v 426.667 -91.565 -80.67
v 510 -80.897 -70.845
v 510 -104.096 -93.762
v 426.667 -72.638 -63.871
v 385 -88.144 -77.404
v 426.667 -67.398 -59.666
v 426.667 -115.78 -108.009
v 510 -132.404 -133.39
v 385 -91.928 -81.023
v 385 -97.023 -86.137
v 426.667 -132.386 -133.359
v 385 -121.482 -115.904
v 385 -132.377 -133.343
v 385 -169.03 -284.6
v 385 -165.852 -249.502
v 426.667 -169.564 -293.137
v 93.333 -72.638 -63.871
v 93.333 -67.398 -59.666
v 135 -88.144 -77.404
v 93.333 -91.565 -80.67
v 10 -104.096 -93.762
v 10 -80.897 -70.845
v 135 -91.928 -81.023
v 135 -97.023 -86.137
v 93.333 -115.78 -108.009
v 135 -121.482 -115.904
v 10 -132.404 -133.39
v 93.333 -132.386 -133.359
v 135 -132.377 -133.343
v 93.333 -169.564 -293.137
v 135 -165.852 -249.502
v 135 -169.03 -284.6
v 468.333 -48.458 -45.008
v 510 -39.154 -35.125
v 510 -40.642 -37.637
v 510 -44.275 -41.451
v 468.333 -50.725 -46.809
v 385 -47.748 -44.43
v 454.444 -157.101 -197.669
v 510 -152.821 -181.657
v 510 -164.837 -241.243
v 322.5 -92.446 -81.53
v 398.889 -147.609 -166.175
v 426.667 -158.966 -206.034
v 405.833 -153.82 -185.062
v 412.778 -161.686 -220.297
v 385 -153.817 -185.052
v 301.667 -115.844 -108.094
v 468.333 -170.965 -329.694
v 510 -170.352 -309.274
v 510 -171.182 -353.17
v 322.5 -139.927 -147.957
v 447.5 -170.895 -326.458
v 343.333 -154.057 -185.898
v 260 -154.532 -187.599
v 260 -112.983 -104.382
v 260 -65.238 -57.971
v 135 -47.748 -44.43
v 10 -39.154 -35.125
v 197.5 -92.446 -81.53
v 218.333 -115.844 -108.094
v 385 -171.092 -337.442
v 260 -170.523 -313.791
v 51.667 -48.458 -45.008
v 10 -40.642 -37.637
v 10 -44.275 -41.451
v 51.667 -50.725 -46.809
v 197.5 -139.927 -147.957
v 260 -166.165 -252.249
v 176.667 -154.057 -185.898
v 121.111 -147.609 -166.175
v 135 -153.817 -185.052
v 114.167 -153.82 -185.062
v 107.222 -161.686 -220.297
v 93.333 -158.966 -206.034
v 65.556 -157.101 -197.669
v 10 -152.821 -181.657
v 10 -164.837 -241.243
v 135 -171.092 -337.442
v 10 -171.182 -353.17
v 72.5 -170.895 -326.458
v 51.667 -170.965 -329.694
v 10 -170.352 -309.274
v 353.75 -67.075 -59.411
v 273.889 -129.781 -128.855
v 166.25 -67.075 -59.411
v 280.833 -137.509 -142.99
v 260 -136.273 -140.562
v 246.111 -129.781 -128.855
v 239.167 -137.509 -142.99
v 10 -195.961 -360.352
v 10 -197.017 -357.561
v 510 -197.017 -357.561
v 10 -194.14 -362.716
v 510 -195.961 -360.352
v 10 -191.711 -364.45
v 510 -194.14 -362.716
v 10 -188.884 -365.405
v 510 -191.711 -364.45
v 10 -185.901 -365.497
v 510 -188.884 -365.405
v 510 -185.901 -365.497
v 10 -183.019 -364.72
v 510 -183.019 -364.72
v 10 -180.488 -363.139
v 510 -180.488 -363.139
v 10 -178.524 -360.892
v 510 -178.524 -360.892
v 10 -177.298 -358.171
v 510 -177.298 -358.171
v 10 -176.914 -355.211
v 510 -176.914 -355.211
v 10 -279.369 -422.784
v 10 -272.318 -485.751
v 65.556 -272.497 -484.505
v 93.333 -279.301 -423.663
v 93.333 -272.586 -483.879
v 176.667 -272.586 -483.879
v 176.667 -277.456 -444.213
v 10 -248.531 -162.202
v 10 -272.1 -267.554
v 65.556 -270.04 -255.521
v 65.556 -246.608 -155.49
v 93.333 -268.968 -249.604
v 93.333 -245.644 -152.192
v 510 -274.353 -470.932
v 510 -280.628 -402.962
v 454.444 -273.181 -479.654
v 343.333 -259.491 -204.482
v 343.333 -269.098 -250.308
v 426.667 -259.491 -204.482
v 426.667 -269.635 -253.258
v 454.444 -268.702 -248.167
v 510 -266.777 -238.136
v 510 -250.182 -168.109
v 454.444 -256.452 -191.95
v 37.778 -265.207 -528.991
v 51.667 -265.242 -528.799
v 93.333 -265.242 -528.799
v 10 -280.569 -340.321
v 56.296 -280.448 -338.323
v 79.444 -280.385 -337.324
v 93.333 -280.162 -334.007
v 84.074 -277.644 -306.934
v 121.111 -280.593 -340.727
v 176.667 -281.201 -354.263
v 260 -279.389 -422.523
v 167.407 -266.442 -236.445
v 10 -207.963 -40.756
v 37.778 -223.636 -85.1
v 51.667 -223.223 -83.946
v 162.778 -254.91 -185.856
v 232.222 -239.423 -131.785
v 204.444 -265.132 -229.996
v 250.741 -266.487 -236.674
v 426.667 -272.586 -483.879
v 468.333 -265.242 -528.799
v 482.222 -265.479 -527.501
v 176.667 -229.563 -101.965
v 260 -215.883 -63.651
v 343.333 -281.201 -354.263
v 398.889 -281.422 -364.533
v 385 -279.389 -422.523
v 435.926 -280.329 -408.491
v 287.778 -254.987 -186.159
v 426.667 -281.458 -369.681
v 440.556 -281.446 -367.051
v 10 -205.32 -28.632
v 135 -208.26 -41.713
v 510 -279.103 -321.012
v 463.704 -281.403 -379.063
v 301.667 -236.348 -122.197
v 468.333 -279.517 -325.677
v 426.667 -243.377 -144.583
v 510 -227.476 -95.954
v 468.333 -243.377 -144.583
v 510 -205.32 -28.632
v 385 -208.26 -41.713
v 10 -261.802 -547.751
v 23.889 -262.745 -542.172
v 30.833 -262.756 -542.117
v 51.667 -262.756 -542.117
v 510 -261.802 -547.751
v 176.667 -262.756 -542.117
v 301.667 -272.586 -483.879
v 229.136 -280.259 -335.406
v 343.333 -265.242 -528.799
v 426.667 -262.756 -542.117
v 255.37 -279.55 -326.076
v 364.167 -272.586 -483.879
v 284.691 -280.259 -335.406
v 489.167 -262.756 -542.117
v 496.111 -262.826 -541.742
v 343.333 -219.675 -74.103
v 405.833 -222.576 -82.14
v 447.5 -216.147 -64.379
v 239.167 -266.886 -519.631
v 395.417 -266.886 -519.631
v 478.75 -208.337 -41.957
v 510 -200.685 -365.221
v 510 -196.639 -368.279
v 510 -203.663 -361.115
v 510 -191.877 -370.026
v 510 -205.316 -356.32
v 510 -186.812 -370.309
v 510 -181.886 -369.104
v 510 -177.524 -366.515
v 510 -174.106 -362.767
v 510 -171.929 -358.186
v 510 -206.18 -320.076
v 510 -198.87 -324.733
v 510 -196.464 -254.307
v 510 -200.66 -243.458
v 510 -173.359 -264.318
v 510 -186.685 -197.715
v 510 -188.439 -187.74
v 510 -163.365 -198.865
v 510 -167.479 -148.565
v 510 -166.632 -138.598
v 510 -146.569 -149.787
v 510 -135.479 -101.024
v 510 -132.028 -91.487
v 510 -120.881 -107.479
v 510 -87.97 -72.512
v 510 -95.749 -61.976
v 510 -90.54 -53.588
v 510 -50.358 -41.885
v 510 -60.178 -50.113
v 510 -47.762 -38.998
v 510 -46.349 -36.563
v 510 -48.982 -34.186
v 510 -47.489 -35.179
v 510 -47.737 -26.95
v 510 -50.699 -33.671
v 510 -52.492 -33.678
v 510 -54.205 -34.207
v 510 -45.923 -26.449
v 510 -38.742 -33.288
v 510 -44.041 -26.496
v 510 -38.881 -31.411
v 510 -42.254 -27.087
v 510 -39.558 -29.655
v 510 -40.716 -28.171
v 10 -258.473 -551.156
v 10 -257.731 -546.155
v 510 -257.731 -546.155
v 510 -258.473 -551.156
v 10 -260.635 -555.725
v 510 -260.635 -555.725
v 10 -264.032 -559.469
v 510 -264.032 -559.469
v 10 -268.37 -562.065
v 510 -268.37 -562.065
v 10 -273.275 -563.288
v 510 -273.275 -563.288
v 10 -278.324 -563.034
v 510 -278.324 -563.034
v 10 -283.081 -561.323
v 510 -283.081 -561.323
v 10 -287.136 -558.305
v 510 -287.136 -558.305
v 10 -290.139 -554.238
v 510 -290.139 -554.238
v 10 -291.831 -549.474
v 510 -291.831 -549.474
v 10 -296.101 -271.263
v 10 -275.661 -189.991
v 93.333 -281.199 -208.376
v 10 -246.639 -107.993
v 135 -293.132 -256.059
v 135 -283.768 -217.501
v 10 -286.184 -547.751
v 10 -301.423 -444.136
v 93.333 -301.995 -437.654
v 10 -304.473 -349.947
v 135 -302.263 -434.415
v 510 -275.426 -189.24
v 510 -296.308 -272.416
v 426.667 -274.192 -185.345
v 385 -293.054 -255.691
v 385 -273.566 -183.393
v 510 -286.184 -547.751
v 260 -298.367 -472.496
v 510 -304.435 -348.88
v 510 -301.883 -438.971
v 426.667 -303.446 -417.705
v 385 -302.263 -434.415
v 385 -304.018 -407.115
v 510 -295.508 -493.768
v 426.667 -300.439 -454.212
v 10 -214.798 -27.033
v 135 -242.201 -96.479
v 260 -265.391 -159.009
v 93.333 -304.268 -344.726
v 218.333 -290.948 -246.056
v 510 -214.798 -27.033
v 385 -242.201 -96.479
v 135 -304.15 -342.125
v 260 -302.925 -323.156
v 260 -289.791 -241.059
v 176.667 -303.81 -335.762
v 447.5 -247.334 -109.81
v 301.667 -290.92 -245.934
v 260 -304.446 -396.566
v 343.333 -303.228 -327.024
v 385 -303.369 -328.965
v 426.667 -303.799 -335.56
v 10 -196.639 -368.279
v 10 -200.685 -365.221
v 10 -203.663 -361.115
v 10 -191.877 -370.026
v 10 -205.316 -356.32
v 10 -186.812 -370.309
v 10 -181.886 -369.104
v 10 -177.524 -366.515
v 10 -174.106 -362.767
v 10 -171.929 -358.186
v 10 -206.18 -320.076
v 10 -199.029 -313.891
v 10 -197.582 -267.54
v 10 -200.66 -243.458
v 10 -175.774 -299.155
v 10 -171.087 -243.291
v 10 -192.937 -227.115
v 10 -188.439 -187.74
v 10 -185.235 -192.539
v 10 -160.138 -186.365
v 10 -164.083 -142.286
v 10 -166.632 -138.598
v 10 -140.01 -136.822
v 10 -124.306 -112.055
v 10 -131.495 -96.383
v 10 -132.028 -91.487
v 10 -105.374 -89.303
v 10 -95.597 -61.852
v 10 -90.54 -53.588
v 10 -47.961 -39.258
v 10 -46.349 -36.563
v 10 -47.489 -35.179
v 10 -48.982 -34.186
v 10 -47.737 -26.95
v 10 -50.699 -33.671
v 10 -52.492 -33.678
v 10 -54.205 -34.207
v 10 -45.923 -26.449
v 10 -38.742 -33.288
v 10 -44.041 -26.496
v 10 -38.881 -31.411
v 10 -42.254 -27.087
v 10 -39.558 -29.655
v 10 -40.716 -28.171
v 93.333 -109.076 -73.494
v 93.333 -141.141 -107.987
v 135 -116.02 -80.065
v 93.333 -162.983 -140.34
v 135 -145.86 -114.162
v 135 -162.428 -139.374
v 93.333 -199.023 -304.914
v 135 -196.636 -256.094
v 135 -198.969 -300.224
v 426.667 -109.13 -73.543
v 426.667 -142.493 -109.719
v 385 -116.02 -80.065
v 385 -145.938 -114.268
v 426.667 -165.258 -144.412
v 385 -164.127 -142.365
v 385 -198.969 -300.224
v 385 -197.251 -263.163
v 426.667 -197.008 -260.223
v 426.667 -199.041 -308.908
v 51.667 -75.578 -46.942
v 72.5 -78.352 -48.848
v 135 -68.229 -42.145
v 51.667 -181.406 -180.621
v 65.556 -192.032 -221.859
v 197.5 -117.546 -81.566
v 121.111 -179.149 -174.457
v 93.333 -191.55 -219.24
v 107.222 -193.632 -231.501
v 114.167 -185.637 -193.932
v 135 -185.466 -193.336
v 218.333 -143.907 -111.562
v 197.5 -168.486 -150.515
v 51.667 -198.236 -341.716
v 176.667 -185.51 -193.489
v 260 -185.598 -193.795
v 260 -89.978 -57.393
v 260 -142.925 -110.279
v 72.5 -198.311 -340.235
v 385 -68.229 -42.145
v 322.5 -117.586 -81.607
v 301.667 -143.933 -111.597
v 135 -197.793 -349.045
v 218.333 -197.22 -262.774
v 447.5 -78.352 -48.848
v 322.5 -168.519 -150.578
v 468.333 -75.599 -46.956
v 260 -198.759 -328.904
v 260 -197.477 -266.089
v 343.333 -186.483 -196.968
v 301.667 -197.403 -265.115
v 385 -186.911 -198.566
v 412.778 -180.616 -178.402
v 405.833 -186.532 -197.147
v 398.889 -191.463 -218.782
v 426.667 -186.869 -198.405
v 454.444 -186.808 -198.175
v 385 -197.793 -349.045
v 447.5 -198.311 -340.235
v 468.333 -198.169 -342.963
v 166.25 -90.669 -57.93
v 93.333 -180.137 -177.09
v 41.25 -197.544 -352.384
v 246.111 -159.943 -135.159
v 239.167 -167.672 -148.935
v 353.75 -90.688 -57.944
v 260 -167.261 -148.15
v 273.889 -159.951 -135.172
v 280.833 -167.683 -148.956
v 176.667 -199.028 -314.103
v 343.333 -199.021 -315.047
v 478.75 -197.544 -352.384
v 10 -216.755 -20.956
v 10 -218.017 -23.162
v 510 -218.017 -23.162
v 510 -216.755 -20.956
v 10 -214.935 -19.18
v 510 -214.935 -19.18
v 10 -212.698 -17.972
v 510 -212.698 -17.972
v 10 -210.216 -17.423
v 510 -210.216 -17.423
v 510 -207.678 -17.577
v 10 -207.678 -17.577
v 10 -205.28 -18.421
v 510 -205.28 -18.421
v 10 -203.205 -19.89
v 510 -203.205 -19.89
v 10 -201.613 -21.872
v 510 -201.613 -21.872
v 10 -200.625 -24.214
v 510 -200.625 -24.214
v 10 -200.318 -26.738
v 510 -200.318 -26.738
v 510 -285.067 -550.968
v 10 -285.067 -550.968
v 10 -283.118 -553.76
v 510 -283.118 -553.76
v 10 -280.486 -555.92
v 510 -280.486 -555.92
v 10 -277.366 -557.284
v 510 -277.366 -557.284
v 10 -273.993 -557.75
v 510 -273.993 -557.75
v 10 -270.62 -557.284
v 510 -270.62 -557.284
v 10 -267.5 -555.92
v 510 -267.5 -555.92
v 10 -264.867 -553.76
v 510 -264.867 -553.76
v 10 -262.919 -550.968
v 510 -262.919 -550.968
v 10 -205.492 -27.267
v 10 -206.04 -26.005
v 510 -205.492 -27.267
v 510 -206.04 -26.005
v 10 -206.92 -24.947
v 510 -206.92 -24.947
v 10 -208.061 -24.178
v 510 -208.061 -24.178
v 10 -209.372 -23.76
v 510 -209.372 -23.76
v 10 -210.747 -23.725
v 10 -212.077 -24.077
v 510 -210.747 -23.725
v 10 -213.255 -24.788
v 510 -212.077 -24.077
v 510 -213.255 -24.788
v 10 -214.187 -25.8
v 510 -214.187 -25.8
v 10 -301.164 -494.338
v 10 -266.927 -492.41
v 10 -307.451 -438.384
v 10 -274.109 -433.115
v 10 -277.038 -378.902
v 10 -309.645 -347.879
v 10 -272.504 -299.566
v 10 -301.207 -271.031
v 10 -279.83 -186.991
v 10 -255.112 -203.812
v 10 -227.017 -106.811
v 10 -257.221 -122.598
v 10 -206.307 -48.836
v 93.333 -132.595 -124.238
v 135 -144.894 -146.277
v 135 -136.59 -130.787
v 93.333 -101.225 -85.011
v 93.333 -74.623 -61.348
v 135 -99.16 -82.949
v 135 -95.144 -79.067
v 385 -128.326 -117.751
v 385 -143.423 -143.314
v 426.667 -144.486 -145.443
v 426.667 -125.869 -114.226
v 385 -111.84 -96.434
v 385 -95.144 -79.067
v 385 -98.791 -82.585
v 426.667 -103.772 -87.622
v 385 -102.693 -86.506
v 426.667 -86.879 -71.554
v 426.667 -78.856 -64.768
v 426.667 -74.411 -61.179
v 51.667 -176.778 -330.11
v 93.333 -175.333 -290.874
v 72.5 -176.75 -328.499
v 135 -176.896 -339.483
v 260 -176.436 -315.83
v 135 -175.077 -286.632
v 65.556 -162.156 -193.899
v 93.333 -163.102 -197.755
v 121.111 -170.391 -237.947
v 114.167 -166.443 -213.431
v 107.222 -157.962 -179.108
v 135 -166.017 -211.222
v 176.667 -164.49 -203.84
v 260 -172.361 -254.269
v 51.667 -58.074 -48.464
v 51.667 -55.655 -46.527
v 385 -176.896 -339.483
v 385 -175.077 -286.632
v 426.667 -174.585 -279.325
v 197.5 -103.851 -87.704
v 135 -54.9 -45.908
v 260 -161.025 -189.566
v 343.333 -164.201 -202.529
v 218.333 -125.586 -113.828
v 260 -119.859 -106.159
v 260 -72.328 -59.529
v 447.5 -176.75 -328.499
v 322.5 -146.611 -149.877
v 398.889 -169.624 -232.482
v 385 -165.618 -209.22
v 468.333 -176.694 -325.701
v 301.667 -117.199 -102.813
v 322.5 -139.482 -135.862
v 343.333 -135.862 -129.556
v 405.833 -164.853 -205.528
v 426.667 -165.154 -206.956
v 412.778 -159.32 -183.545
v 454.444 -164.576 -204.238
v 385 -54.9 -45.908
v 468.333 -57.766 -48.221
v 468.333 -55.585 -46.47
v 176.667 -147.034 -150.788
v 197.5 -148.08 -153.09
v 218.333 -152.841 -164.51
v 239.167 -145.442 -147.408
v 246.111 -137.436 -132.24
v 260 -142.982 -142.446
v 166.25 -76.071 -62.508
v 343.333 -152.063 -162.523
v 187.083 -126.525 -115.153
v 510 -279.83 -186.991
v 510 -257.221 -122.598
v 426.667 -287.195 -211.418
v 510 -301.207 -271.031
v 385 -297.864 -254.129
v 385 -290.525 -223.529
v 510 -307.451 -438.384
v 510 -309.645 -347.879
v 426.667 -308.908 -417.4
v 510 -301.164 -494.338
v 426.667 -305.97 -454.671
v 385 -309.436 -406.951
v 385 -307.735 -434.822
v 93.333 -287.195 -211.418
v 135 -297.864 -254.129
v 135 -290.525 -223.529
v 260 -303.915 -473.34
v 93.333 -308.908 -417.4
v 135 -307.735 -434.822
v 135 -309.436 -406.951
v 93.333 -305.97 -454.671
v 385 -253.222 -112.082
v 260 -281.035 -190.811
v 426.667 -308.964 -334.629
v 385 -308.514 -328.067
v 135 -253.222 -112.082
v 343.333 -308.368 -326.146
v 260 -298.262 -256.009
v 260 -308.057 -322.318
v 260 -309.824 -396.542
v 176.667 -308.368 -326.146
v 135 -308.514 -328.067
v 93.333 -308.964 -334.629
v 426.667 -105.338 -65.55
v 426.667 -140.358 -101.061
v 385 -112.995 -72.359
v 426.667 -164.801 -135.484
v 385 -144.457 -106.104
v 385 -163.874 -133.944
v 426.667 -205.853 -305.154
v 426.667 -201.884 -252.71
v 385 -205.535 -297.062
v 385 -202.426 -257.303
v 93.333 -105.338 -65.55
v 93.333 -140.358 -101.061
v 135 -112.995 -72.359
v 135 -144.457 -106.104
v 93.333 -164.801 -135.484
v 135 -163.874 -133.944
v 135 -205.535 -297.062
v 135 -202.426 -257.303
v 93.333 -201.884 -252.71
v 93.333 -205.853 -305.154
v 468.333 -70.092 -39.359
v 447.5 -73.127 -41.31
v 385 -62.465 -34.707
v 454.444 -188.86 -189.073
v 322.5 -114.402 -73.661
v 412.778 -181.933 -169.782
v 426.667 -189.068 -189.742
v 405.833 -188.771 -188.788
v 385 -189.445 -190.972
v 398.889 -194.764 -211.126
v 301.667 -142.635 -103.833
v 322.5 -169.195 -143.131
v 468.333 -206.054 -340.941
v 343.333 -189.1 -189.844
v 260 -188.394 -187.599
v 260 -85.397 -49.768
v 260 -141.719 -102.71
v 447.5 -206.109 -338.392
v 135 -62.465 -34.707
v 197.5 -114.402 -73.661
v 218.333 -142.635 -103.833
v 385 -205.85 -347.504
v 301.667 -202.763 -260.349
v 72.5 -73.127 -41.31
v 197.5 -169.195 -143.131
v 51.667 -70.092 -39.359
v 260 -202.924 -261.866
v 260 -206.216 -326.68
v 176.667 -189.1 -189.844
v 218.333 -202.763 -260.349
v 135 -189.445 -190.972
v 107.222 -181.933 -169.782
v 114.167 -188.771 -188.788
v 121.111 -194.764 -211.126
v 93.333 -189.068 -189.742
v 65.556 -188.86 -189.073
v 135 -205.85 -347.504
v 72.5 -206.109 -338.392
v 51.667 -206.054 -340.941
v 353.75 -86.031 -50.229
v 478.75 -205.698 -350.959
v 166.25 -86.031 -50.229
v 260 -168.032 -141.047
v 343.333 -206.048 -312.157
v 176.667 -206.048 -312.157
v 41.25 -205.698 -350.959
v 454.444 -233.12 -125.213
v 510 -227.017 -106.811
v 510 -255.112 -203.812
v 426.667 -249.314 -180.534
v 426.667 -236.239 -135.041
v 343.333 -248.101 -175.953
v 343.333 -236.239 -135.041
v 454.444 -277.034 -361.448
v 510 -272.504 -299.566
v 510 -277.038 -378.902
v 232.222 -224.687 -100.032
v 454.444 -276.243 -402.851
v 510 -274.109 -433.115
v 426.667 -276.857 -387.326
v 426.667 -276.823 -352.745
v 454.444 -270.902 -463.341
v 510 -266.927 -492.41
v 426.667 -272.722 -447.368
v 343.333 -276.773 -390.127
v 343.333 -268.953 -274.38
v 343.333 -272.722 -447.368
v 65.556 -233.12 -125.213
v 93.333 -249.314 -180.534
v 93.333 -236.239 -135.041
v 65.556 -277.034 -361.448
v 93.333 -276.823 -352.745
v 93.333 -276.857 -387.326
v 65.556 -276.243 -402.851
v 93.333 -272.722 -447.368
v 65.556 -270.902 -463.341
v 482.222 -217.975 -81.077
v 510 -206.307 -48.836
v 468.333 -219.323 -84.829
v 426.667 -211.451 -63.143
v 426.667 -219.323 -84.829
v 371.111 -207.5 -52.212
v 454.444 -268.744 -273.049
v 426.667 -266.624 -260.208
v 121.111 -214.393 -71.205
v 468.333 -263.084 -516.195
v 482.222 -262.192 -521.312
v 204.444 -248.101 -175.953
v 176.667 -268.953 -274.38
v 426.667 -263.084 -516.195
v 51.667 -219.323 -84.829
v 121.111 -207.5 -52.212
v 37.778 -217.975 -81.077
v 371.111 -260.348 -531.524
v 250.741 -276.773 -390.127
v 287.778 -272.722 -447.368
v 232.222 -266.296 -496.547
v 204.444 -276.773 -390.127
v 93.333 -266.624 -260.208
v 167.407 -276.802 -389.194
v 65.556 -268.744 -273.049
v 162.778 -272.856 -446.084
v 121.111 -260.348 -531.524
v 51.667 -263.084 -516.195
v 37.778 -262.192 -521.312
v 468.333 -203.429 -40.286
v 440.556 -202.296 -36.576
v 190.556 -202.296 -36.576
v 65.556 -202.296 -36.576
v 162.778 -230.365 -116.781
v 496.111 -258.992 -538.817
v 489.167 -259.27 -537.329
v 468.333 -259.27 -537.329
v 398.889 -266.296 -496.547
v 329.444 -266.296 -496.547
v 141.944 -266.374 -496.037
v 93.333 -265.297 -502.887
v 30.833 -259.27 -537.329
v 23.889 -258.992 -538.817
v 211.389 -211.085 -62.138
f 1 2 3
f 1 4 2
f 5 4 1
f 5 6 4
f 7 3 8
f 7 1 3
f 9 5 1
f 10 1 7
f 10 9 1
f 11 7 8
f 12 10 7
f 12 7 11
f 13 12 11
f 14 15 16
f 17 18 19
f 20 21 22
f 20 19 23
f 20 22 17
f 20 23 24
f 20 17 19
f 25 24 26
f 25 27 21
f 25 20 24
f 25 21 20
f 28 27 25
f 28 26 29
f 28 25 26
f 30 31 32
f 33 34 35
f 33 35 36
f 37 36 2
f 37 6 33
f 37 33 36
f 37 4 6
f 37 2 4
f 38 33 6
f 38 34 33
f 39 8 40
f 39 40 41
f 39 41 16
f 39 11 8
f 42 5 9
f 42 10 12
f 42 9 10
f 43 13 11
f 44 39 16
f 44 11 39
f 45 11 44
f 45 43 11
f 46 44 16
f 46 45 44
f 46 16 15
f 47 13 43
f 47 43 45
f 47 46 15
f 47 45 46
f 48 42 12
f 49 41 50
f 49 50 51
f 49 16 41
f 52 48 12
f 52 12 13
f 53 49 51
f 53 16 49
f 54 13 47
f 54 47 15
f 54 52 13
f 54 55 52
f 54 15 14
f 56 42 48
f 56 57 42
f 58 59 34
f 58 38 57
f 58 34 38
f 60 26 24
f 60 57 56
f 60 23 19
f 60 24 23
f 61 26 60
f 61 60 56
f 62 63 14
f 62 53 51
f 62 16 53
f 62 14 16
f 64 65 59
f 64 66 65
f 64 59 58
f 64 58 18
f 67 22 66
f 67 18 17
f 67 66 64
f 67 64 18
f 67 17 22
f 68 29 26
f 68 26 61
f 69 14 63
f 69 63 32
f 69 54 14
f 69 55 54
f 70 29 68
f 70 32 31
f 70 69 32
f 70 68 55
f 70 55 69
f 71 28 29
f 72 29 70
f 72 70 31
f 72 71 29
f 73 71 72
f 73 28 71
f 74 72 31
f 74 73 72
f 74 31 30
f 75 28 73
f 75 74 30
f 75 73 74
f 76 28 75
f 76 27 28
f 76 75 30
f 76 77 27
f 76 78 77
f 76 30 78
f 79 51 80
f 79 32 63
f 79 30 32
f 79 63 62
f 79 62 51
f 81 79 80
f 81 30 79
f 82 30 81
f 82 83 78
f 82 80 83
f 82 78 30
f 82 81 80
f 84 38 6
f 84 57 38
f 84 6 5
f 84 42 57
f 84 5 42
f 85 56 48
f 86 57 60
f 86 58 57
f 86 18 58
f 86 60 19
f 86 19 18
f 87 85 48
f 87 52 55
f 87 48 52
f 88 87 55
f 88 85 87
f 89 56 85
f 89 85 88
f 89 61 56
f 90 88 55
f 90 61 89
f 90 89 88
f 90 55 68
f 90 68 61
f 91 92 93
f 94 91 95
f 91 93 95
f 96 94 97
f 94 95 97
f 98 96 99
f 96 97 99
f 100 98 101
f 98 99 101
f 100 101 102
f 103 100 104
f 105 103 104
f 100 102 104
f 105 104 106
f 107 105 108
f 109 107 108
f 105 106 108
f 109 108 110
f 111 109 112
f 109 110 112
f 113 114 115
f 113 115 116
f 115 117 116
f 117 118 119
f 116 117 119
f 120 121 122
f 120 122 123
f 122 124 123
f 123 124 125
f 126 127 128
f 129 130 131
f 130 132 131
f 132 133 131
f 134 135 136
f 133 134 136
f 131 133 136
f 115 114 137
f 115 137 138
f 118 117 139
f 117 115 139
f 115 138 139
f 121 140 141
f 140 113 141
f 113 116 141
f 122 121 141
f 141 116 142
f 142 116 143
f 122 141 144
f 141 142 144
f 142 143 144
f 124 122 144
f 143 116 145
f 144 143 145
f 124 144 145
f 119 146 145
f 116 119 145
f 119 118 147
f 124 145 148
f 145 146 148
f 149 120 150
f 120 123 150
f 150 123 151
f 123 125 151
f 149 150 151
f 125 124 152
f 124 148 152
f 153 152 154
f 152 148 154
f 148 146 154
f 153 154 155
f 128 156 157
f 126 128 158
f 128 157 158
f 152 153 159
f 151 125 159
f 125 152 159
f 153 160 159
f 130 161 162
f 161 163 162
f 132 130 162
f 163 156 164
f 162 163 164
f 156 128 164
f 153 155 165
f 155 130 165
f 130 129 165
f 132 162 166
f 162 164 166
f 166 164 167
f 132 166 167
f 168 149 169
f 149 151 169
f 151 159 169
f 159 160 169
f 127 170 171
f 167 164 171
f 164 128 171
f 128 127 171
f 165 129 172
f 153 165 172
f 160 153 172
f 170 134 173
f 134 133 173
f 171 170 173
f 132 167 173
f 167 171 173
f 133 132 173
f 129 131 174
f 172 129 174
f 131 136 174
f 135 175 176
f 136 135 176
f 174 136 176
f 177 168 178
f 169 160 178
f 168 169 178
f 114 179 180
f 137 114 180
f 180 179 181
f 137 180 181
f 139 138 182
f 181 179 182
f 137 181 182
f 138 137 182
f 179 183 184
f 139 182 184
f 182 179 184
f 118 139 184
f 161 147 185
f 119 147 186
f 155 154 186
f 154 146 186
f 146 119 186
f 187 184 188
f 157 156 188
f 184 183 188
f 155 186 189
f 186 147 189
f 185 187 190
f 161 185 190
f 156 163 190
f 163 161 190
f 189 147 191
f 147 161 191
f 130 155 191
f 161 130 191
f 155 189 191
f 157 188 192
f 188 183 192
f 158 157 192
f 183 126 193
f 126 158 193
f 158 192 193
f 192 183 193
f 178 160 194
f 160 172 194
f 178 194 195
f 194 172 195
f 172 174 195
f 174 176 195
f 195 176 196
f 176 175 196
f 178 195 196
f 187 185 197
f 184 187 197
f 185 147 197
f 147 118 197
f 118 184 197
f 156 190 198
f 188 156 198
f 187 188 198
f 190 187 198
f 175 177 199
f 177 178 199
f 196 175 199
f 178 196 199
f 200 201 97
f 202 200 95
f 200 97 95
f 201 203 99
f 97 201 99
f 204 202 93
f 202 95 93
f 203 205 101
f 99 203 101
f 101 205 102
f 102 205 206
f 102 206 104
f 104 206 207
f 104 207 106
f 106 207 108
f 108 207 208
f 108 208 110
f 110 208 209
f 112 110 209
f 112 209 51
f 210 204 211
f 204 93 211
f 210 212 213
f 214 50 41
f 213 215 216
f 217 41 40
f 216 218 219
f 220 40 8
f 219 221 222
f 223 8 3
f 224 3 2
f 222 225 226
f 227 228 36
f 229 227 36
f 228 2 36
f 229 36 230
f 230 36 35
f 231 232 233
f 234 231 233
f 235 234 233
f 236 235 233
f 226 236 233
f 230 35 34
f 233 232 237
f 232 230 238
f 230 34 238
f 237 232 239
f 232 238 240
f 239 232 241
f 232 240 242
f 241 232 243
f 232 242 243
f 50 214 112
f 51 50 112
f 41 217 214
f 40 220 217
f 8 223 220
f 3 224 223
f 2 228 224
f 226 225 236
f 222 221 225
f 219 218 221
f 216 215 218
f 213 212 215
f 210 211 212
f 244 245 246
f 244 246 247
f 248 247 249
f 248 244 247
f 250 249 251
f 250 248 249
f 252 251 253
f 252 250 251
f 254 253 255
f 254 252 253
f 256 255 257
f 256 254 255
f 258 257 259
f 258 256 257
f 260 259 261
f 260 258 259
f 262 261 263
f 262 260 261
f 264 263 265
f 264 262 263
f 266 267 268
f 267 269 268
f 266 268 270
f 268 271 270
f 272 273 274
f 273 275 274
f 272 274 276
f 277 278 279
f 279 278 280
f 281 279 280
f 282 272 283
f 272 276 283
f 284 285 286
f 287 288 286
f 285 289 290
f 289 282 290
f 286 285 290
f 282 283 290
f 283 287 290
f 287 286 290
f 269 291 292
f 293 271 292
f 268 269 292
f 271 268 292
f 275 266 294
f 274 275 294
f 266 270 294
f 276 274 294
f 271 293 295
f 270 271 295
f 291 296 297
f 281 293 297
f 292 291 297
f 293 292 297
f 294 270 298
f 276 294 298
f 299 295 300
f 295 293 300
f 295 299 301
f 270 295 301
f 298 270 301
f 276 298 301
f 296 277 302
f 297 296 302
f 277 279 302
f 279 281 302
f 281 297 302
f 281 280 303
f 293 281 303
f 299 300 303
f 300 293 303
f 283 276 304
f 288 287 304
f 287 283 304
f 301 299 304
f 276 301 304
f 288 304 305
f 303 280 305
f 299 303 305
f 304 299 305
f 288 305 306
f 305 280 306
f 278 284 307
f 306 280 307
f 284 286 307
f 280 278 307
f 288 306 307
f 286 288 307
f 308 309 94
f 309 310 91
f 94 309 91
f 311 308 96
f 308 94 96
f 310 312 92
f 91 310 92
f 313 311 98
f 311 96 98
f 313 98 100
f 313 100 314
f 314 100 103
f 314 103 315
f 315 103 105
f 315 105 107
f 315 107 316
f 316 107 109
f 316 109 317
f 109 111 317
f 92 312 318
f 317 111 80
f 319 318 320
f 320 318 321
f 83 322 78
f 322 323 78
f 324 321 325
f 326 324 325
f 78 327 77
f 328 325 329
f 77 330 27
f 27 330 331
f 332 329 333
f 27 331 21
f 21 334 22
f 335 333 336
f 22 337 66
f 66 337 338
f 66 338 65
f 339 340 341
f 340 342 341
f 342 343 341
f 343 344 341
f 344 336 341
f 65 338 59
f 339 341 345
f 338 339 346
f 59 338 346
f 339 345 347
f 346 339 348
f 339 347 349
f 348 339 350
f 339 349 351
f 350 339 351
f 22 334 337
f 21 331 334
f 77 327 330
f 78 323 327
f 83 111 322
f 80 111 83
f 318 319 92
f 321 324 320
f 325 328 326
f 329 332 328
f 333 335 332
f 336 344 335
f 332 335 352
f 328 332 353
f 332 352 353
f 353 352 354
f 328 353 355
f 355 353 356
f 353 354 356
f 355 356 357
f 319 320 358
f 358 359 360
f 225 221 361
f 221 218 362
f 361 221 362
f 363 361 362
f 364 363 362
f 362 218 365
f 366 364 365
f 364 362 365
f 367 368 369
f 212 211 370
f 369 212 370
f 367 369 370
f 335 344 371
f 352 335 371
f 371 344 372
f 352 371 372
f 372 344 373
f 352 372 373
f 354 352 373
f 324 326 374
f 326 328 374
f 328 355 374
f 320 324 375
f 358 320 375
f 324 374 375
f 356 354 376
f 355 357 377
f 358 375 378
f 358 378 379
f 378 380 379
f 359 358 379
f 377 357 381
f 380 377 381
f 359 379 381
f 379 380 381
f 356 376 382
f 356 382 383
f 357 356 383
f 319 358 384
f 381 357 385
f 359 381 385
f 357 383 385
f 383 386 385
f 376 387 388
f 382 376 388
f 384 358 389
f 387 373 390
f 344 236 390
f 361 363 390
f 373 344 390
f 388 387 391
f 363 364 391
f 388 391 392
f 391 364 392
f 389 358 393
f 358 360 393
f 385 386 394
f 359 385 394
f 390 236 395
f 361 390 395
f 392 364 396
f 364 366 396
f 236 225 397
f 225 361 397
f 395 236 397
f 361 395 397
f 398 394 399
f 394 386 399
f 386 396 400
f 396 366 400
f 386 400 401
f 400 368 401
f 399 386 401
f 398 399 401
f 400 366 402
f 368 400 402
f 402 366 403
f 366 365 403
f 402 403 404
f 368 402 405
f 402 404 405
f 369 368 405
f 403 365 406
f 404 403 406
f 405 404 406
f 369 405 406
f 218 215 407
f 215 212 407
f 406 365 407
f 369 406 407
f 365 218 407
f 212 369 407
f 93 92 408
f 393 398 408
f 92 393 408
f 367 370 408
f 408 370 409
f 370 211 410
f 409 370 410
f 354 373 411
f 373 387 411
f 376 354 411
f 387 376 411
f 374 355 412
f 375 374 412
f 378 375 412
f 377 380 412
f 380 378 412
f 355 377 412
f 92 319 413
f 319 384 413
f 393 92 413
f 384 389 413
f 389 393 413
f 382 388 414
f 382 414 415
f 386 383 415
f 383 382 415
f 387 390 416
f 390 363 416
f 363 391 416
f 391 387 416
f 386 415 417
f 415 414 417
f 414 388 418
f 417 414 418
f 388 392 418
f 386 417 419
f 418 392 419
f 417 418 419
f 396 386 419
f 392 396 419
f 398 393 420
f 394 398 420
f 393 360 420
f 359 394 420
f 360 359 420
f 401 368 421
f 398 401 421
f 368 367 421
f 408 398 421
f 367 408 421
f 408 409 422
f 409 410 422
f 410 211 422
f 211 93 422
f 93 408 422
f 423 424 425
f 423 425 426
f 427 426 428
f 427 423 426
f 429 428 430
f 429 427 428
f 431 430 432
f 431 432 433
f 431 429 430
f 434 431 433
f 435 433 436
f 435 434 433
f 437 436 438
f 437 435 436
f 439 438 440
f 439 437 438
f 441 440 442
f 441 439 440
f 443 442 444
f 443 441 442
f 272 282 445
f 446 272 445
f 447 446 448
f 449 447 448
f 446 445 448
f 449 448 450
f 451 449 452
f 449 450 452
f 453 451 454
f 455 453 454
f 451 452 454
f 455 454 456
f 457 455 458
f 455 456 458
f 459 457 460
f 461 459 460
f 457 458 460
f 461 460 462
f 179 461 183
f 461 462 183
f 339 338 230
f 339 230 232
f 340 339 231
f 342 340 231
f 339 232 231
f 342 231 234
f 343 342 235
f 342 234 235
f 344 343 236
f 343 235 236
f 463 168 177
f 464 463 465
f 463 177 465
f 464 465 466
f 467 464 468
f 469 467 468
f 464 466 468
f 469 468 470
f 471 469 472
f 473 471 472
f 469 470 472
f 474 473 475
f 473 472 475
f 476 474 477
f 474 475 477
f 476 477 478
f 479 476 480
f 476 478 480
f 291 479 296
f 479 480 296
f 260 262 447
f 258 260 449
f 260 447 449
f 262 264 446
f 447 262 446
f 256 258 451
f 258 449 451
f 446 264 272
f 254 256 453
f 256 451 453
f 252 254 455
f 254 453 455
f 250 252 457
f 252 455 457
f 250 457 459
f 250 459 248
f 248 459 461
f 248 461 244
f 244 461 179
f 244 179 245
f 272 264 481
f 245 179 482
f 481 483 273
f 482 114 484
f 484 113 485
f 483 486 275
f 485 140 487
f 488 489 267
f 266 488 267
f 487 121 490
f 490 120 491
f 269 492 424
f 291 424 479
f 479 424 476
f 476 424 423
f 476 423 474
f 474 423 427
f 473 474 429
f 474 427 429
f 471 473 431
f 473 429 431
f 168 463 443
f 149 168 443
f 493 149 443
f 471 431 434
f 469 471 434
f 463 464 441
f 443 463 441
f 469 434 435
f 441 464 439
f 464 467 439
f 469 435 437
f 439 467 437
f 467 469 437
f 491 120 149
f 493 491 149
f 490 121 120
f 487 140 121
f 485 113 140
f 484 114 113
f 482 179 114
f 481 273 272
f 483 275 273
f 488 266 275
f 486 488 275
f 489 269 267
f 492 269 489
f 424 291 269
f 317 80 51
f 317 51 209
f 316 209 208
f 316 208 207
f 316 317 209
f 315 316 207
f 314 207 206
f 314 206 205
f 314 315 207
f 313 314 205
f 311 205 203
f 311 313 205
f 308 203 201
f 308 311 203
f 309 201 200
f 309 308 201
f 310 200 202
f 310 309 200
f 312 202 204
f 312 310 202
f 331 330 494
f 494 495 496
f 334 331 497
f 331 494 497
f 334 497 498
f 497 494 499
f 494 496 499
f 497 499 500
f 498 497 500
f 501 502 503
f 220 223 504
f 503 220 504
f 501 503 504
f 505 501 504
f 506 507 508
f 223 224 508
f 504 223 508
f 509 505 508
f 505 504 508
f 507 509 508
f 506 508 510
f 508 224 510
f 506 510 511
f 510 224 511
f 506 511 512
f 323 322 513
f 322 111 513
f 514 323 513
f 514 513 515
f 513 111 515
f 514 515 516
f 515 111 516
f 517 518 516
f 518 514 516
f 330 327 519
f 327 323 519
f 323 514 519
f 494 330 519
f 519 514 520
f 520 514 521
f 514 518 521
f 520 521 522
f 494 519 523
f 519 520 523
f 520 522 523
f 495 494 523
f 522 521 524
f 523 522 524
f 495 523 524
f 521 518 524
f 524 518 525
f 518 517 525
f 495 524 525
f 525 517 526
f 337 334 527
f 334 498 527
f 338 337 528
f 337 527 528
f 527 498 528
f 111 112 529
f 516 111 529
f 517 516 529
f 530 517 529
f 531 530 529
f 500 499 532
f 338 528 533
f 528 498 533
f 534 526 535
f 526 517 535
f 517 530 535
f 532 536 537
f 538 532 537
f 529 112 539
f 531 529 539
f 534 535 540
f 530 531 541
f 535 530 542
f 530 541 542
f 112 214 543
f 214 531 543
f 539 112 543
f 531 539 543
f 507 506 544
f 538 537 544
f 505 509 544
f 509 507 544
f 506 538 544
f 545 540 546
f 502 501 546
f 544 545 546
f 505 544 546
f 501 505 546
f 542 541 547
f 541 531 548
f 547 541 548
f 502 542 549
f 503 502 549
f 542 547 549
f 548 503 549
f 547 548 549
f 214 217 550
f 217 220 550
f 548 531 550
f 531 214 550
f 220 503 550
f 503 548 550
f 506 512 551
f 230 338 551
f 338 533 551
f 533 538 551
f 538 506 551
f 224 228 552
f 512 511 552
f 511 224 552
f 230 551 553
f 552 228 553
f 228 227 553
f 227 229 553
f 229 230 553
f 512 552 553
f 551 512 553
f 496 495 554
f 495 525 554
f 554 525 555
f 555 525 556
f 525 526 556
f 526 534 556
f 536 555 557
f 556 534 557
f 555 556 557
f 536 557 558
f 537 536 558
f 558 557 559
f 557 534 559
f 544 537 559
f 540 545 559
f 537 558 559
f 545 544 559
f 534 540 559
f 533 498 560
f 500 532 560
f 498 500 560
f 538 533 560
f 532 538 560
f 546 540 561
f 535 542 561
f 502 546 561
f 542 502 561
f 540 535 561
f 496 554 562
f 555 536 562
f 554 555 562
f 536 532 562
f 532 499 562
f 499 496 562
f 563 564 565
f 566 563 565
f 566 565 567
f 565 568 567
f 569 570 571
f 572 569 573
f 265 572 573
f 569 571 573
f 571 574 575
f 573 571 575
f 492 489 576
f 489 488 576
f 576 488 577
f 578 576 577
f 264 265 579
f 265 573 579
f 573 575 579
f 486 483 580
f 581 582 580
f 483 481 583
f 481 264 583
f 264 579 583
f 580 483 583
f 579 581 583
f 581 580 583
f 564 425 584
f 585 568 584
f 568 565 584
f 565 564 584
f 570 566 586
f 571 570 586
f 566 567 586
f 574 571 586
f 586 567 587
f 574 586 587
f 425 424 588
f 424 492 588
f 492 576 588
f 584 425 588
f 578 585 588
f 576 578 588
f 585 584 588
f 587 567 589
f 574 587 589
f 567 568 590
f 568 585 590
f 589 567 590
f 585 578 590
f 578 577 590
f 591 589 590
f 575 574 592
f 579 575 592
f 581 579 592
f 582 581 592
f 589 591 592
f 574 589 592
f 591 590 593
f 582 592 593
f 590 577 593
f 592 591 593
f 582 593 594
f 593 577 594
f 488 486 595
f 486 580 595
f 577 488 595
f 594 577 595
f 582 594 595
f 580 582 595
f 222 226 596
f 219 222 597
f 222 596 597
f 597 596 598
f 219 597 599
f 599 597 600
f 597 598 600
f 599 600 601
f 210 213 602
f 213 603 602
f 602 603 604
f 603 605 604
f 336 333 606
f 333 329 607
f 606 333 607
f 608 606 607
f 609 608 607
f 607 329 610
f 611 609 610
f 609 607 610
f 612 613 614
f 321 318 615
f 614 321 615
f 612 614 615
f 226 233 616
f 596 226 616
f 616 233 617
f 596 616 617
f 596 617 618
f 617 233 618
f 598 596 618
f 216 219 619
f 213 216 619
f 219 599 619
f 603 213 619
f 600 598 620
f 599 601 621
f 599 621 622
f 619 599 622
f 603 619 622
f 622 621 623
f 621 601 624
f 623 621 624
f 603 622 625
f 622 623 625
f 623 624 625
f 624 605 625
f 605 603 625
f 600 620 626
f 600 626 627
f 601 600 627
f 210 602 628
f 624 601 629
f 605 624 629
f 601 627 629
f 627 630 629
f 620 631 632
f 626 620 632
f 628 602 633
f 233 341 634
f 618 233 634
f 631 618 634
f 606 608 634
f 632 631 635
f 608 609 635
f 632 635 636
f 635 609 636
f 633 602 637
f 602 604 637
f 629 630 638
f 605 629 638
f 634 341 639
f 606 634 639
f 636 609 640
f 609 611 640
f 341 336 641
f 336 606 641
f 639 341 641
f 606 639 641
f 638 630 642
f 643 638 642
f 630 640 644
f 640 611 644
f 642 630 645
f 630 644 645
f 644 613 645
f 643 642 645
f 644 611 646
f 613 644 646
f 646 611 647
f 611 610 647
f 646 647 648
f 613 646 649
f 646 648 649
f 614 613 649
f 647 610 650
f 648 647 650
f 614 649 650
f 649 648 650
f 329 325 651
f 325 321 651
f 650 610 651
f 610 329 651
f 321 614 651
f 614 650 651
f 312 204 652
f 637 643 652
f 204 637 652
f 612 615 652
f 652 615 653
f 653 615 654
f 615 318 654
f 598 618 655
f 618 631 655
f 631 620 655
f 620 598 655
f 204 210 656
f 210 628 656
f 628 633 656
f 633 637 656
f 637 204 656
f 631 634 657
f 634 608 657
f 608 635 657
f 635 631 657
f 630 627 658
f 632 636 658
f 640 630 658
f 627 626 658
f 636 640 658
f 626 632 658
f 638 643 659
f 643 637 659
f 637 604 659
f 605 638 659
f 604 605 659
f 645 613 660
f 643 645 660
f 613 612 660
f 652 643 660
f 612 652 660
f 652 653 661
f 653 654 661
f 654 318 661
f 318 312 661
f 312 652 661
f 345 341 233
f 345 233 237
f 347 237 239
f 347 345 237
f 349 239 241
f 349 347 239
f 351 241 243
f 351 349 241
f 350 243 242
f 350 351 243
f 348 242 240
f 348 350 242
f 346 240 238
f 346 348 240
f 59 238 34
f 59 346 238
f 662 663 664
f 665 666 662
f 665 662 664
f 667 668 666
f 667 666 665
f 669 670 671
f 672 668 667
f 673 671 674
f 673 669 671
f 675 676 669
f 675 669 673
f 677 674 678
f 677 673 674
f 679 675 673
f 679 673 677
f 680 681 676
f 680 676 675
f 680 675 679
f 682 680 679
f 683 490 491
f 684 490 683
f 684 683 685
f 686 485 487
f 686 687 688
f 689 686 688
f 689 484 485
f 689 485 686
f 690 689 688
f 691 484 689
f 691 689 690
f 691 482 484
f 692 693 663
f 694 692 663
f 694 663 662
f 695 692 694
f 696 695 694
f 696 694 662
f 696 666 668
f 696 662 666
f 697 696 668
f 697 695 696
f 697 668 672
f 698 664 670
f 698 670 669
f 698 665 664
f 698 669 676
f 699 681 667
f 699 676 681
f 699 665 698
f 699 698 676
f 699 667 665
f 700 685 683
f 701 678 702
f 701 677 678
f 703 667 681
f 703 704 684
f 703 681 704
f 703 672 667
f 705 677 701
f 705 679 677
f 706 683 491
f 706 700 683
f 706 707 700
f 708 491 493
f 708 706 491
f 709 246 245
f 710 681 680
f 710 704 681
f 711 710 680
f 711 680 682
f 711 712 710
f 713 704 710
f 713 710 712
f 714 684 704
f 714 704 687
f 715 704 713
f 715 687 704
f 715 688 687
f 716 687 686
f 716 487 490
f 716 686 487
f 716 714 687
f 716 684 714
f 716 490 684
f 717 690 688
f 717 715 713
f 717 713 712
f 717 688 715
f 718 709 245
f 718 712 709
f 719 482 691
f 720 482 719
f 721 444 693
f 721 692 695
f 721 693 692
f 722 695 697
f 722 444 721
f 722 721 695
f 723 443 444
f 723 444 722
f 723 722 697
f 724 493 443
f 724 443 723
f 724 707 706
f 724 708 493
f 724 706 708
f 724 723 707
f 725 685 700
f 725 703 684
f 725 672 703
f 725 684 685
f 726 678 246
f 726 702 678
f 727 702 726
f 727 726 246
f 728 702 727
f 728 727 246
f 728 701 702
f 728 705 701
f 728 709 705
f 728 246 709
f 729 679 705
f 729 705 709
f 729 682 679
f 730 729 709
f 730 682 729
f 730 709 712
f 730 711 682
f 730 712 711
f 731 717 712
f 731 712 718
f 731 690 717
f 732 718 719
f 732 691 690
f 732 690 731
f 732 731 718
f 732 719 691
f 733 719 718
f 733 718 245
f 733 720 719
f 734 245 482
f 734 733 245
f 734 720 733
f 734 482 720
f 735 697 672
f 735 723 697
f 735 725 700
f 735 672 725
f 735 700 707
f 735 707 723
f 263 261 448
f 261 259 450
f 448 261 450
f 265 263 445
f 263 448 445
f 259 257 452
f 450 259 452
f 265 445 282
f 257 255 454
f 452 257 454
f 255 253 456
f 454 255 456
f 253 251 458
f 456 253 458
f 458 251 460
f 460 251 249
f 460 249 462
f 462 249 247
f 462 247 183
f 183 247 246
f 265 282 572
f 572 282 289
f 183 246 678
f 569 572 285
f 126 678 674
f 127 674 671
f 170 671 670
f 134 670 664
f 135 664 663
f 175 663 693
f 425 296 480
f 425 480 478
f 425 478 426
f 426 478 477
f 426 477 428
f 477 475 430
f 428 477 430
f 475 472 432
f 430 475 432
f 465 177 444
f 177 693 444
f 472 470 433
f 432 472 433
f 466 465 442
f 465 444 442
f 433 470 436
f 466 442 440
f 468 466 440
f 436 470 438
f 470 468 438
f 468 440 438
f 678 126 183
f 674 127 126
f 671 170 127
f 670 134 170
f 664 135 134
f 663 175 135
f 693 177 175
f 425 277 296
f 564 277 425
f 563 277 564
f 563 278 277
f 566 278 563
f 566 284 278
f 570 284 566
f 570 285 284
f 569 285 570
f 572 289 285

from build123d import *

# Parameters (mm, degrees)
BOSS_EXTRUDE1_DEPTH = 10
BOSS_EXTRUDE3_DEPTH = 500
SPLIT1_DEPTH        = 10
CUT_EXTRUDE4_DEPTH  = 815.609824939


# Read off the part's stored shape, not the designer's step: Split1
with BuildPart() as part:
    # Sketch1 → Boss-Extrude1 (new body)
    with BuildSketch(Plane(origin=(0, 0, 0), x_dir=(0, 0, -1), z_dir=(1, 0, 0))):
        with BuildLine():
            Line((0, -14.281480067), (0, -294.281480067))
            ThreePointArc((0, -294.281480067), (8.786796564, -315.494683503), (30, -324.281480067))
            Line((30, -324.281480067), (573.815572472, -324.281480067))
            ThreePointArc((573.815572472, -324.281480067), (580.886640283, -321.352547879), (583.815572472, -314.281480067))
            Line((583.815572472, -314.281480067), (583.815572472, -219.493566063))
            ThreePointArc((583.815572472, -219.493566063), (582.007092914, -213.757801699), (577.235773905, -210.096639855))
            Line((577.235773905, -210.096639855), (13.420201433, -4.88455386))
            ThreePointArc((13.420201433, -4.88455386), (4.264235636, -6.089959625), (0, -14.281480067))
        make_face()
    extrude(amount=BOSS_EXTRUDE1_DEPTH)

    # Sketch2 → Boss-Extrude3 (add)
    with BuildSketch(Plane(origin=(10, 0, 0), x_dir=(0, 0, -1), z_dir=(1, 0, 0))):
        with BuildLine():
            ThreePointArc((23.162175785, -218.017297737), (17.576945532, -207.678107035), (26.738120061, -200.318314743))
            add(Edge.make_bspline(
                [(26.738120061, -200.318314743), (45.914354434, -200.660753587), (151.32107334, -255.510398156), (414.880335601, -286.385074175), (542.431128002, -257.731725159), (546.154906269, -257.731029979)],
                knots=[0, 0, 0, 0, 0.560935224, 0.660935224, 1, 1, 1, 1], degree=3))
            ThreePointArc((546.154906269, -257.731029979), (563.288388976, -273.27487263), (549.474047026, -291.831036849))
            add(Edge.make_bspline(
                [(23.162175785, -218.017297737), (143.080818041, -266.034178467), (284.669923623, -324.572171749), (474.750080899, -306.502271197), (549.474047026, -291.831036849)],
                knots=[0, 0, 0, 0, 0.576111686, 1, 1, 1, 1], degree=3))
        make_face()
        with BuildLine():
            ThreePointArc((26.950185671, -47.737214996), (28.17113687, -40.715672082), (35.124917897, -39.154353359))
            add(Edge.make_bspline(
                [(35.124917897, -39.154353359), (50.602952828, -45.122445935), (99.042539, -170.661871263), (331.224003862, -171.181746235), (353.169530365, -171.181734297)],
                knots=[0, 0, 0, 0, 0.639195597, 1, 1, 1, 1], degree=3))
            ThreePointArc((353.169530365, -171.181734297), (370.309371751, -186.812434708), (356.32010769, -205.316311305))
            add(Edge.make_bspline(
                [(26.950185671, -47.737214996), (35.312726243, -66.629555086), (121.396454164, -217.989087479), (352.838937223, -205.964445921), (356.32010769, -205.316311305)],
                knots=[0, 0, 0, 0, 0.59031533, 1, 1, 1, 1], degree=3))
        make_face()
    extrude(amount=BOSS_EXTRUDE3_DEPTH)

    # Split1 outline → Split1 (cut)
    with BuildSketch(Plane.YZ):
        with BuildLine():
            ThreePointArc((-294.281480067, 0), (-315.494683503, -8.786796564), (-324.281480067, -30))
            Line((-324.281480067, -30), (-324.281480067, -573.815572472))
            ThreePointArc((-324.281480067, -573.815572472), (-321.352547879, -580.886640284), (-314.281480067, -583.815572472))
            Line((-314.281480067, -583.815572472), (-219.493566063, -583.815572472))
            ThreePointArc((-219.493566063, -583.815572472), (-213.7578017, -582.007092914), (-210.096639855, -577.235773905))
            Line((-210.096639855, -577.235773905), (-4.88455386, -13.420201433))
            ThreePointArc((-4.88455386, -13.420201433), (-6.089959625, -4.264235637), (-14.281480067, 0))
            Line((-14.281480067, 0), (-294.281480067, 0))
        make_face()
    extrude(amount=SPLIT1_DEPTH, mode=Mode.SUBTRACT)

    # Sketch4 → Cut-Extrude4 (cut, through all)
    with BuildSketch(Plane(origin=(510, 0, 0), x_dir=(0, 0, -1), z_dir=(1, 0, 0))):
        with BuildLine():
            ThreePointArc((36.563368255, -46.349264869), (33.864766991, -49.821146991), (34.206527229, -54.205165034))
            add(Edge.make_bspline(
                [(34.206527229, -54.205165034), (42.853728256, -72.241323292), (130.60126666, -216.180799122), (354.210920858, -197.746703186), (357.560551344, -197.017263718)],
                knots=[0, 0, 0, 0, 0.59031533, 1, 1, 1, 1], degree=3))
            ThreePointArc((357.560551344, -197.017263718), (365.49715028, -185.900768208), (355.211383297, -176.91360666))
            add(Edge.make_bspline(
                [(355.211383297, -176.91360666), (333.266088603, -177.014474156), (101.084686466, -177.561646331), (52.068667432, -52.246161661), (36.563368255, -46.349264869)],
                knots=[0, 0, 0, 0, 0.360804403, 1, 1, 1, 1], degree=3))
        make_face()
        with BuildLine():
            ThreePointArc((28.631678276, -205.319570052), (23.759562286, -209.371755875), (27.033044981, -214.797807405))
            add(Edge.make_bspline(
                [(27.033044981, -214.797807405), (145.772718684, -261.916580998), (285.975450577, -319.373780693), (473.898492503, -300.921699774), (547.751286849, -286.183901532)],
                knots=[0, 0, 0, 0, 0.576111686, 1, 1, 1, 1], degree=3))
            ThreePointArc((547.751286849, -286.183901532), (557.749935034, -273.992815704), (547.751286849, -261.801729876))
            add(Edge.make_bspline(
                [(547.751286849, -261.801729876), (544.030343063, -261.808782649), (416.625523479, -290.658115415), (153.214077759, -260.256942022), (47.793906807, -205.629006111), (28.631678276, -205.319570052)],
                knots=[0, 0, 0, 0, 0.339064776, 0.439064776, 1, 1, 1, 1], degree=3))
        make_face()
    extrude(amount=-CUT_EXTRUDE4_DEPTH, mode=Mode.SUBTRACT)


solid = part.part
